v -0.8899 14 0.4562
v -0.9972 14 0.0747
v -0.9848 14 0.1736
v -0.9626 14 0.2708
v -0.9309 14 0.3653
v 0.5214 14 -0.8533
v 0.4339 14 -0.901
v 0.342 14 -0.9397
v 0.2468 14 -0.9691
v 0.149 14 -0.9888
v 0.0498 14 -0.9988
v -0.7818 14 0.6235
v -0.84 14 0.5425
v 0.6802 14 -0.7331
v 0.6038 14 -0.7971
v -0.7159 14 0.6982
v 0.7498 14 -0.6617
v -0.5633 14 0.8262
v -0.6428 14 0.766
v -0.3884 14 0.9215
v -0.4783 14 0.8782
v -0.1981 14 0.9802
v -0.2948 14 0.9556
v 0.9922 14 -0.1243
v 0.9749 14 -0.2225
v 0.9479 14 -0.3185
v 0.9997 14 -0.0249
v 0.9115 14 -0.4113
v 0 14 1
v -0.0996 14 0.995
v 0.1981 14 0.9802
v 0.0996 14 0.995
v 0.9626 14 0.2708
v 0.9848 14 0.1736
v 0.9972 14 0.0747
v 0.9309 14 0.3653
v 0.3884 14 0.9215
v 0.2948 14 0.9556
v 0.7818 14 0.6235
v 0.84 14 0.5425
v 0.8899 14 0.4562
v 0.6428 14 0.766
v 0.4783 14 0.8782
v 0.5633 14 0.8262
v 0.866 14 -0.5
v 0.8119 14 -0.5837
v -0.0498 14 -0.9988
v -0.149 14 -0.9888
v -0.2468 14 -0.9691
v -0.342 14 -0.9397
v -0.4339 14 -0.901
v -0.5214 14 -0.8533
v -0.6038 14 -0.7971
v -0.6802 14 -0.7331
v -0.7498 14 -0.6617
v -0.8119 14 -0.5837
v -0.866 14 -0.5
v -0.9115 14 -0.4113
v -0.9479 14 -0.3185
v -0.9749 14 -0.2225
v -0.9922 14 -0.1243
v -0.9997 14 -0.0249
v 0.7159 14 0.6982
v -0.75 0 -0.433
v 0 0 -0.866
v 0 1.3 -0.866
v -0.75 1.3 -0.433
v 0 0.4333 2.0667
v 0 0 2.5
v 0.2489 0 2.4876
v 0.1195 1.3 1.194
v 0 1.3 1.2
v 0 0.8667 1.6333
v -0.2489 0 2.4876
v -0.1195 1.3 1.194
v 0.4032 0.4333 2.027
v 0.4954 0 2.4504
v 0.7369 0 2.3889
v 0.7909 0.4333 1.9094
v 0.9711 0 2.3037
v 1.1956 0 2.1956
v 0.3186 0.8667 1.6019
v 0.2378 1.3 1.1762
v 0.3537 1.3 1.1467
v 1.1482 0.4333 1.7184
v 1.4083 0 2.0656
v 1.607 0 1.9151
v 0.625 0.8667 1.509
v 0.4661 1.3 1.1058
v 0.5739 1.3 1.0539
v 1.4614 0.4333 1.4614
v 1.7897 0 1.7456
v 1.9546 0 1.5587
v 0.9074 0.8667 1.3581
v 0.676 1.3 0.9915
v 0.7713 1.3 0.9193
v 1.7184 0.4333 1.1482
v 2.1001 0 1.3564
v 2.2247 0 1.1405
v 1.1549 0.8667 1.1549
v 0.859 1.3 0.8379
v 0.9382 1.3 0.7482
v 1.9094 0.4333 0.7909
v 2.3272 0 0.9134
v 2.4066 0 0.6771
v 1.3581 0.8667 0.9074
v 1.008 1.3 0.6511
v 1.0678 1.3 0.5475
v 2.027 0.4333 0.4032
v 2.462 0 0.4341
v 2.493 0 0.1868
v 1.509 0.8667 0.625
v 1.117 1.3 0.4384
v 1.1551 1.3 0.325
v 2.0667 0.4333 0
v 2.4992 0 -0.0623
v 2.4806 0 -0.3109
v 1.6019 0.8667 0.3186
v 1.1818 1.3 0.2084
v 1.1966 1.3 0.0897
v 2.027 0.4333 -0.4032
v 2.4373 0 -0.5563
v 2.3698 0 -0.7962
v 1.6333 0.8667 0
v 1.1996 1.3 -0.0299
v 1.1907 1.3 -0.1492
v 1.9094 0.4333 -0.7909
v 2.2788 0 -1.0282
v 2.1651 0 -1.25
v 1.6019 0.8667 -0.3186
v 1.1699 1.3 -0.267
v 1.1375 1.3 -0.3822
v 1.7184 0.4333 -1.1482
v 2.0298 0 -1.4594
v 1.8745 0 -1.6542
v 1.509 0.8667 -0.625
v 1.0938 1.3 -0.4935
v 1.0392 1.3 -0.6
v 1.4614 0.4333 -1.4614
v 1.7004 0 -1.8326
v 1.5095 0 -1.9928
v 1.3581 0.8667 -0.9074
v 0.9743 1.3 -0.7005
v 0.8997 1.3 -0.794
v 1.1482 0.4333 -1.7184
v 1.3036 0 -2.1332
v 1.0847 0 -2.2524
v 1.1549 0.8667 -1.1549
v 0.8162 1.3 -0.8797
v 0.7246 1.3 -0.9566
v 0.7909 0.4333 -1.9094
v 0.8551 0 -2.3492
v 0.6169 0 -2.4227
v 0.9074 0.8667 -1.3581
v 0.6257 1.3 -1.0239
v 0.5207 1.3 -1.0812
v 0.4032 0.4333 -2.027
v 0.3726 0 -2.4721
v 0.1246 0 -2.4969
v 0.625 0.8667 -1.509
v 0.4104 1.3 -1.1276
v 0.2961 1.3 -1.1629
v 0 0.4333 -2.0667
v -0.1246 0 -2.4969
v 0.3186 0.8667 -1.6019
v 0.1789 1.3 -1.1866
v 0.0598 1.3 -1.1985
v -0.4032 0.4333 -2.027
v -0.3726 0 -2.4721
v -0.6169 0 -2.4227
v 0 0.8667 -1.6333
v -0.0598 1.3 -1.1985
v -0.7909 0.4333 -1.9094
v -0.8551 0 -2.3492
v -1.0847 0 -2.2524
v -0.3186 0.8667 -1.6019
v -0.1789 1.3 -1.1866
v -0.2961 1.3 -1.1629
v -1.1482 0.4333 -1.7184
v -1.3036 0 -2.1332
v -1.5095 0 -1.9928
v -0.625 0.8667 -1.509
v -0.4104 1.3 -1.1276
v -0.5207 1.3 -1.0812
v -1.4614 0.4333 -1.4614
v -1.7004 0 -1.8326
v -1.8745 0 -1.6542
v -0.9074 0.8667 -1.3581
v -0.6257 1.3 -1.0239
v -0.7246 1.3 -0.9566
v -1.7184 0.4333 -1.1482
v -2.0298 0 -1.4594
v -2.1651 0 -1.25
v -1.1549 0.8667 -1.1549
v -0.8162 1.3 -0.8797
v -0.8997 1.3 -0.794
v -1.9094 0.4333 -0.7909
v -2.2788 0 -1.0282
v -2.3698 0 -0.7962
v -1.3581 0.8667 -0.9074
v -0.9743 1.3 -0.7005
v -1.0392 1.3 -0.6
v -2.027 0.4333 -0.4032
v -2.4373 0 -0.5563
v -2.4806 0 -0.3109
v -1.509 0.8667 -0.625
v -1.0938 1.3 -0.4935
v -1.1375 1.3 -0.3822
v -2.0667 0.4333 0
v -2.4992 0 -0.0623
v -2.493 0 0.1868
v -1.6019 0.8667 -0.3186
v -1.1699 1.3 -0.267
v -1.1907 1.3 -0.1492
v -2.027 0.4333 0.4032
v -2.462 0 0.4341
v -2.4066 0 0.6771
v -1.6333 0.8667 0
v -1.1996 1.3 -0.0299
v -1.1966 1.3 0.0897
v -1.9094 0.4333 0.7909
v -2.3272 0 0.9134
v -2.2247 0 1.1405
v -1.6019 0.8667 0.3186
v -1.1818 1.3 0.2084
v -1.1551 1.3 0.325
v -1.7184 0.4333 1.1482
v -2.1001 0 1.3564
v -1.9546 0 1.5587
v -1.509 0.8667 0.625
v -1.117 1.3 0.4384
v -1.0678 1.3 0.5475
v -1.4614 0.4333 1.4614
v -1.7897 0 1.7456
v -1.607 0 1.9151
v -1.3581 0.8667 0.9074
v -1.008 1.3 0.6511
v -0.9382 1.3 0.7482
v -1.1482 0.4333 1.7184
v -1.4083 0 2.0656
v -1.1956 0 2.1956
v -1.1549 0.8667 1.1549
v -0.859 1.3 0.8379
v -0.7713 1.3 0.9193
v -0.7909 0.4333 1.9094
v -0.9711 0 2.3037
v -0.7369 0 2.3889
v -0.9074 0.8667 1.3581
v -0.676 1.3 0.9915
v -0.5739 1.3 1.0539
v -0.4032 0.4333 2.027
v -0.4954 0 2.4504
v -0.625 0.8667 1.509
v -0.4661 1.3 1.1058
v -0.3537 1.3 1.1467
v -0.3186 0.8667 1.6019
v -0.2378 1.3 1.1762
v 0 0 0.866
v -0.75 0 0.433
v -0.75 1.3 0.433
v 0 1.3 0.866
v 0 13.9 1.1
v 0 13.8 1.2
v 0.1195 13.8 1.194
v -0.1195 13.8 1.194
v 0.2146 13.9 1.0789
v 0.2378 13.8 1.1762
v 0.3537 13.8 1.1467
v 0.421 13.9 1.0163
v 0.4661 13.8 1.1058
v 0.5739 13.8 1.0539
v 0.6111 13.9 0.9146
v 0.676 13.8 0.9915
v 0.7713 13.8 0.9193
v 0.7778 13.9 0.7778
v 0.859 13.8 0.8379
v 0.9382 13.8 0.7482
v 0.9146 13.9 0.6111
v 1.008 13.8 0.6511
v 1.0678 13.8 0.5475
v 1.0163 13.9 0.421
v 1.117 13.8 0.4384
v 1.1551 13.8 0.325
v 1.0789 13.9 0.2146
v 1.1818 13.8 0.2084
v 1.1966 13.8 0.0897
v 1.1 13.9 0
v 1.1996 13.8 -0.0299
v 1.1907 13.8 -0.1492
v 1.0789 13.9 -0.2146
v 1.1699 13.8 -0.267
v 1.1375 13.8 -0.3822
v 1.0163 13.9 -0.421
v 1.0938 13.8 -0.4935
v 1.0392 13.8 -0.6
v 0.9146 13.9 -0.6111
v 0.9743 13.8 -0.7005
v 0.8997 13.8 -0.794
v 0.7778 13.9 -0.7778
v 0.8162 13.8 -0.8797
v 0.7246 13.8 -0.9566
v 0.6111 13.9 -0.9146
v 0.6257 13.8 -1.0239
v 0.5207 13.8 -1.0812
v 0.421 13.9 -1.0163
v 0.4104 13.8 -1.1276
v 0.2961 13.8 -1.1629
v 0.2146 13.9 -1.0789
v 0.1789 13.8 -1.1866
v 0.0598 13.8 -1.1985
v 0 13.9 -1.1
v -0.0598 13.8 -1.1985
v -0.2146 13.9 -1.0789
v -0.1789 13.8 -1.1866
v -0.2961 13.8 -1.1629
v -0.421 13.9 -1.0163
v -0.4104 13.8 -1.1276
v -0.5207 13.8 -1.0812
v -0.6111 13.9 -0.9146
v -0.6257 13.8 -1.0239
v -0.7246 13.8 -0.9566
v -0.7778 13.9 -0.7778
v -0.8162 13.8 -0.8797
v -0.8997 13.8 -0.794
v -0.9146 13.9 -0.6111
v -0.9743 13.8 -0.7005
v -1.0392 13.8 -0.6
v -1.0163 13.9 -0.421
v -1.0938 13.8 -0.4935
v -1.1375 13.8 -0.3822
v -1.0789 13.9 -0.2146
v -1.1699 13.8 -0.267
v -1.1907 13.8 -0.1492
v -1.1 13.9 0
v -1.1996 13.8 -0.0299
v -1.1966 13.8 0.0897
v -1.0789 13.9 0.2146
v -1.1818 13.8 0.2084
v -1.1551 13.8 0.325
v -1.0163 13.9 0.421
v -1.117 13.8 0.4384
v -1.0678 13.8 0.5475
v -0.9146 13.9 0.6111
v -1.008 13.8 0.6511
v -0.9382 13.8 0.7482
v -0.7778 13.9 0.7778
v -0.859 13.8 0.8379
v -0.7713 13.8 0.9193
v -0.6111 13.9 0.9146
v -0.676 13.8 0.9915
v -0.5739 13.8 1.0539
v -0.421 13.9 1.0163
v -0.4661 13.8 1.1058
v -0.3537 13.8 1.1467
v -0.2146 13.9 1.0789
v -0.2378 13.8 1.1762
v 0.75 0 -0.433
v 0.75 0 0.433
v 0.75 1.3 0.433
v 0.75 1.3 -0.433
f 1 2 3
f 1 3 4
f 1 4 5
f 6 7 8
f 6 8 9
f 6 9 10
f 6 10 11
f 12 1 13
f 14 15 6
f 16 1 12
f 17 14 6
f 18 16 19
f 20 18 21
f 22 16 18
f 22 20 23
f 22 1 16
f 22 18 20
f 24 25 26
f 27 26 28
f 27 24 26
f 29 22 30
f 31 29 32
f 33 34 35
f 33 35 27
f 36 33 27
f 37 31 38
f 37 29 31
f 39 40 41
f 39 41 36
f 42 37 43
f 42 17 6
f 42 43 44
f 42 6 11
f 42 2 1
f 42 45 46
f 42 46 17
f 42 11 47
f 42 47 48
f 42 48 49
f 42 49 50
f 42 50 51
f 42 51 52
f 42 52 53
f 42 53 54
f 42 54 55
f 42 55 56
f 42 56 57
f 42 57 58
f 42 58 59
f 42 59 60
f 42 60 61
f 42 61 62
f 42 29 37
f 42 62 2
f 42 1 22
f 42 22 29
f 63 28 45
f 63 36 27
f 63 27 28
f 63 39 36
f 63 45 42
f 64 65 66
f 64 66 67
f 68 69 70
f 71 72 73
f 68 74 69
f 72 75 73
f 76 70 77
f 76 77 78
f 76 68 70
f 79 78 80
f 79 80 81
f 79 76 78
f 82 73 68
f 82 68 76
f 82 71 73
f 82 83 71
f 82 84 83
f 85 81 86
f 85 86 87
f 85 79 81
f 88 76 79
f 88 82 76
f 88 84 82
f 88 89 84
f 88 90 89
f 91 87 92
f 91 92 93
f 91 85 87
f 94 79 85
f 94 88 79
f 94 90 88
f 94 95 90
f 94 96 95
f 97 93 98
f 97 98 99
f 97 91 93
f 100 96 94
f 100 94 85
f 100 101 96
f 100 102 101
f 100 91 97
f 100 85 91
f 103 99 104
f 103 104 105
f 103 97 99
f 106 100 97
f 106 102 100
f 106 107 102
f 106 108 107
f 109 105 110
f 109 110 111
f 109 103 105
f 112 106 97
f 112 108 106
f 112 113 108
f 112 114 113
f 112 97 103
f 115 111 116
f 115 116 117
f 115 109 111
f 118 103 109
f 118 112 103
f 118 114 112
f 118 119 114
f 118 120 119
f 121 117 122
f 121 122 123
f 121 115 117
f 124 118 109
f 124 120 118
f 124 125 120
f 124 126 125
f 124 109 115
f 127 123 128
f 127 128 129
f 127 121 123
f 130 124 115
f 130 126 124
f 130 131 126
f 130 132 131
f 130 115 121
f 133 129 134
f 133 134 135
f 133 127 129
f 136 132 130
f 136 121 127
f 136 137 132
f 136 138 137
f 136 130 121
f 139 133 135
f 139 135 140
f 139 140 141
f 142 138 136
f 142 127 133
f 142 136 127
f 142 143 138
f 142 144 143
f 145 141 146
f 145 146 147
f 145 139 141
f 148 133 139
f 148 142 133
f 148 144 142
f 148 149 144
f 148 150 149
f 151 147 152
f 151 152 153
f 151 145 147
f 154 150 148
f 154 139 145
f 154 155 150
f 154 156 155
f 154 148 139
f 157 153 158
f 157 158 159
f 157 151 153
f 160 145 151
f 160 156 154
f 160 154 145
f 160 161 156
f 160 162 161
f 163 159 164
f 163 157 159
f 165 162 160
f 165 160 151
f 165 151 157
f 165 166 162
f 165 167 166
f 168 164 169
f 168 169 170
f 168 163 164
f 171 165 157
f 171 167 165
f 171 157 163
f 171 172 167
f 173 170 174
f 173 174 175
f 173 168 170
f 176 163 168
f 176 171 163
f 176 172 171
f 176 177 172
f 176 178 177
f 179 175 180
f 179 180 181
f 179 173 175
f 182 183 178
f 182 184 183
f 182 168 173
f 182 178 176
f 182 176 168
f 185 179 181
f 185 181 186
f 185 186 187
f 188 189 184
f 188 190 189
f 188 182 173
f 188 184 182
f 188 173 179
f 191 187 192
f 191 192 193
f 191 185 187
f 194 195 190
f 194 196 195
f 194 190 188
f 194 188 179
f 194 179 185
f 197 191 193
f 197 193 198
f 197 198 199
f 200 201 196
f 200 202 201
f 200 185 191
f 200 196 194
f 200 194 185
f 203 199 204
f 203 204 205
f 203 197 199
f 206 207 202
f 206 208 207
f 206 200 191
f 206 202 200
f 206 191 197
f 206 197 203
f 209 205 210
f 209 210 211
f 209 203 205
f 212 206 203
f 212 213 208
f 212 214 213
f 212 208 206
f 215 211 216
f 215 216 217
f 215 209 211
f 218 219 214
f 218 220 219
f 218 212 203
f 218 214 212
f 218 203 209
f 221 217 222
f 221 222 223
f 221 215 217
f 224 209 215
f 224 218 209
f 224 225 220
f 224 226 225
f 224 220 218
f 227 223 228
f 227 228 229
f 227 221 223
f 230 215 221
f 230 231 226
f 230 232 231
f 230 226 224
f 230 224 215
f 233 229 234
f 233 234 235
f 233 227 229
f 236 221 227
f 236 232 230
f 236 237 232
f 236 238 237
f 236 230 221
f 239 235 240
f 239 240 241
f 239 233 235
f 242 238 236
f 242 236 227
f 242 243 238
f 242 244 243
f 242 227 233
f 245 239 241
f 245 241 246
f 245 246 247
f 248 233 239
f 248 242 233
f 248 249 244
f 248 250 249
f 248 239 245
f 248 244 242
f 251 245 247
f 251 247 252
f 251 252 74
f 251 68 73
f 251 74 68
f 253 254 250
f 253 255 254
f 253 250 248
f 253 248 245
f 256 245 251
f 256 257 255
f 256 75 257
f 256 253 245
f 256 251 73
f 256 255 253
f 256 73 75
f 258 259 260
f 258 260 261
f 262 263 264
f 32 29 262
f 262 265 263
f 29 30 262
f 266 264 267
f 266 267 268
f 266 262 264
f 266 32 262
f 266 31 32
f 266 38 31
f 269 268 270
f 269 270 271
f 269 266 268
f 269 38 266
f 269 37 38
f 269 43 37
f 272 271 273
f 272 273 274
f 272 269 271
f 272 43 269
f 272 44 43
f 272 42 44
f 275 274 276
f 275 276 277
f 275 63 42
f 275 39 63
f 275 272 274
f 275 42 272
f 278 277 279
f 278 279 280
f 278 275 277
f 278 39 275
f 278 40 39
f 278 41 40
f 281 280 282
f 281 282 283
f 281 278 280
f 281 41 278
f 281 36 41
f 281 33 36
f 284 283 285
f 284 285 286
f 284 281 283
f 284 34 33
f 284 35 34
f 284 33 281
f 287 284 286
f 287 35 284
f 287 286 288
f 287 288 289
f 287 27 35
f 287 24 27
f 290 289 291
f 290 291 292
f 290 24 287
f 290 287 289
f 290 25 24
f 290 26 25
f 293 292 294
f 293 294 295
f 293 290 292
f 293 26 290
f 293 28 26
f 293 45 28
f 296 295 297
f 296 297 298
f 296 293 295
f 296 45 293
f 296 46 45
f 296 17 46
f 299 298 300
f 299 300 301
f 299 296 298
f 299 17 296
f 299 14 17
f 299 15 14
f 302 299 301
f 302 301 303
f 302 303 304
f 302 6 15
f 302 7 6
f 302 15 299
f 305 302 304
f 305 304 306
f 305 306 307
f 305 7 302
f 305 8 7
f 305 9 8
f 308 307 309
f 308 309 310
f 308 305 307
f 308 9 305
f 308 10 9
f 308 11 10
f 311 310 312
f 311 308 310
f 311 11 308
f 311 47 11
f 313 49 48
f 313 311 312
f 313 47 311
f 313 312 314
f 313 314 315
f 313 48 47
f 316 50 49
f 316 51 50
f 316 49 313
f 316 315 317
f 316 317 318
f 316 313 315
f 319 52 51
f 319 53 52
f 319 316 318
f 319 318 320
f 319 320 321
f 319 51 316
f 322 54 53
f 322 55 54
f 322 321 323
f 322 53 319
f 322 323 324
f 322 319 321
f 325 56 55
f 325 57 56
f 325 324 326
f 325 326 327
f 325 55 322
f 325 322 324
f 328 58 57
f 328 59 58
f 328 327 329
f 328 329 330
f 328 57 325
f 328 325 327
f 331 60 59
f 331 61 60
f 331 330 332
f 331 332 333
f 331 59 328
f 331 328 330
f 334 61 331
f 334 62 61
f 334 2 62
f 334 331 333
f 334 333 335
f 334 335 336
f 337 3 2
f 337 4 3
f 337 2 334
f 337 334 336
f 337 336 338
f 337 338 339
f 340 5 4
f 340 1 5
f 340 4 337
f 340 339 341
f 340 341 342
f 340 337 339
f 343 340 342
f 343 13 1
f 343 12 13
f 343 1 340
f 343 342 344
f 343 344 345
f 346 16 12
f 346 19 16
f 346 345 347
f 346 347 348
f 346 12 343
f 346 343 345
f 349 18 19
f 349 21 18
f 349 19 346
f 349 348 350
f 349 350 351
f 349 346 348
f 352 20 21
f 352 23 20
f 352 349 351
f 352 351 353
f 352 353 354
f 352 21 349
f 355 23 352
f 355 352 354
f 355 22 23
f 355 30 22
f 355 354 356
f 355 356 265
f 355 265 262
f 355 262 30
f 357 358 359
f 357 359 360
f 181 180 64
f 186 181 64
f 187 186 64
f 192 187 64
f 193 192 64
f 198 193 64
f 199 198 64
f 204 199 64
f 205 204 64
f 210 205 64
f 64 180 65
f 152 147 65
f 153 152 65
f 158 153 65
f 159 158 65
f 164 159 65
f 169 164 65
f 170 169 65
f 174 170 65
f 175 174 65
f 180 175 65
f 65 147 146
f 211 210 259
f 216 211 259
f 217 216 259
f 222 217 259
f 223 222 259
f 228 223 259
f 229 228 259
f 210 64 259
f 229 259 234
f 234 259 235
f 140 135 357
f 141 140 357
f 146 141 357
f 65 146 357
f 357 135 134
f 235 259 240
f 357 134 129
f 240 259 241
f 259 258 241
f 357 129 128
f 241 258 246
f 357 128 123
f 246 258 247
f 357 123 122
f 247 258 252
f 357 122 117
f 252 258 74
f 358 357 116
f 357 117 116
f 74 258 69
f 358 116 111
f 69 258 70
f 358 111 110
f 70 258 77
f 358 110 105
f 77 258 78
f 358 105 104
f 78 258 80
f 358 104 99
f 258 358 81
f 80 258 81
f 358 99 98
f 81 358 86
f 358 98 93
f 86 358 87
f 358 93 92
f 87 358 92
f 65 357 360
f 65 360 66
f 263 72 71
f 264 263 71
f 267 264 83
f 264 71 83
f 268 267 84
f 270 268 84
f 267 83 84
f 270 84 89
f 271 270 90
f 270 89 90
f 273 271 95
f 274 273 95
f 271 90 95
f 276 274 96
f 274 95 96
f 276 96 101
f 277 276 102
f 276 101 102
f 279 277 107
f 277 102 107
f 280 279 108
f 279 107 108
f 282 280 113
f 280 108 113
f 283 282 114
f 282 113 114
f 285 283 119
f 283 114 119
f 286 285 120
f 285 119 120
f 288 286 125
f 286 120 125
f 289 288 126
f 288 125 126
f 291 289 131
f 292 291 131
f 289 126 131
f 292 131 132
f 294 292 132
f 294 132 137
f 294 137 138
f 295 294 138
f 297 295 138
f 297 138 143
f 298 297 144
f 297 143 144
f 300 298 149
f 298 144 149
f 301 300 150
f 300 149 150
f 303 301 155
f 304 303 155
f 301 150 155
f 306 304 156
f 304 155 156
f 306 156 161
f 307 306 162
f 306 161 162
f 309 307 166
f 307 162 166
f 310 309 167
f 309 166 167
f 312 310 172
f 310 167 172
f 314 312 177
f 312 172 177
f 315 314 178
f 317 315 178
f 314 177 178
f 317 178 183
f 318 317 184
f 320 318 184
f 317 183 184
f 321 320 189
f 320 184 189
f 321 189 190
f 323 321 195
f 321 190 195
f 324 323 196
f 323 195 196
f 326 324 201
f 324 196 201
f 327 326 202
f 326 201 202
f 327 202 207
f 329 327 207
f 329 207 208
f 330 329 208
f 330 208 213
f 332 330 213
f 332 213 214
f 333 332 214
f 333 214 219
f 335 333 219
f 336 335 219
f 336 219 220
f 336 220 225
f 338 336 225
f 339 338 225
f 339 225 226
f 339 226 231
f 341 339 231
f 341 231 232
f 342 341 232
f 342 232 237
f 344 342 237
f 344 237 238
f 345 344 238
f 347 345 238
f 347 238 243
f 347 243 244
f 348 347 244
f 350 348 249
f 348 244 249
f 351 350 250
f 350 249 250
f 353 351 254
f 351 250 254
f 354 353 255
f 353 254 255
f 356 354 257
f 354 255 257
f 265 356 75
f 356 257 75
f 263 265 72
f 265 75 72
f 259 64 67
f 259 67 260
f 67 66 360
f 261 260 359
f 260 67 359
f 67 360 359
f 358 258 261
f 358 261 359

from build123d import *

# Parameters (mm, degrees)
SKETCH_1_R      = 2.5
EXTRUDE_1_DEPTH = 1.3
CHAMFER_1_SIZE  = 1.3
SKETCH_2_R      = 1.2
EXTRUDE_2_DEPTH = 12.7
CHAMFER_2_SIZE  = 0.2


with BuildPart() as part:
    # 草图1 → 凸台-拉伸1 (new body)
    with BuildSketch(Plane(origin=(0, 0, 0), x_dir=(1, 0, 0), z_dir=(0, 1, 0))):
        with Locations(Location((0, 0, 0), (0, 0, 270))):
            Circle(SKETCH_1_R)
        Polygon((0, -0.866025404), (0.75, -0.433012702), (0.75, 0.433012702), (0, 0.866025404), (-0.75, 0.433012702), (-0.75, -0.433012702), align=None, mode=Mode.SUBTRACT)
    extrude(amount=EXTRUDE_1_DEPTH)

    # 倒角1
    # the kernel refuses this chamfer: 1.3 mm, written as the material it takes off along each edge
    with BuildSketch(Plane(origin=(0, 1.3, 0), x_dir=(0, 0, 1), z_dir=(-1, 0, 0))) as chamfer_1_piece_1:
        Polygon((2.5, -CHAMFER_1_SIZE), (2.5 - CHAMFER_1_SIZE, 0), (2.5, 0), align=None)
    revolve(axis=Axis((0, 1.3, 0), (0, 1, 0)), mode=Mode.SUBTRACT)

    # 草图2 → 凸台-拉伸2 (add)
    with BuildSketch(Plane(origin=(0, 1.3, 0), x_dir=(1, 0, 0), z_dir=(0, 1, 0))):
        with Locations(Location((0, 0, 0), (0, 0, 270))):
            Circle(SKETCH_2_R)
    extrude(amount=EXTRUDE_2_DEPTH)

    # 倒角2
    chamfer_2_edges = [part.edges().sort_by_distance(p)[0] for p in [
        (0, 14, -1.2),
    ]]
    chamfer(chamfer_2_edges, length=CHAMFER_2_SIZE)


solid = part.part
